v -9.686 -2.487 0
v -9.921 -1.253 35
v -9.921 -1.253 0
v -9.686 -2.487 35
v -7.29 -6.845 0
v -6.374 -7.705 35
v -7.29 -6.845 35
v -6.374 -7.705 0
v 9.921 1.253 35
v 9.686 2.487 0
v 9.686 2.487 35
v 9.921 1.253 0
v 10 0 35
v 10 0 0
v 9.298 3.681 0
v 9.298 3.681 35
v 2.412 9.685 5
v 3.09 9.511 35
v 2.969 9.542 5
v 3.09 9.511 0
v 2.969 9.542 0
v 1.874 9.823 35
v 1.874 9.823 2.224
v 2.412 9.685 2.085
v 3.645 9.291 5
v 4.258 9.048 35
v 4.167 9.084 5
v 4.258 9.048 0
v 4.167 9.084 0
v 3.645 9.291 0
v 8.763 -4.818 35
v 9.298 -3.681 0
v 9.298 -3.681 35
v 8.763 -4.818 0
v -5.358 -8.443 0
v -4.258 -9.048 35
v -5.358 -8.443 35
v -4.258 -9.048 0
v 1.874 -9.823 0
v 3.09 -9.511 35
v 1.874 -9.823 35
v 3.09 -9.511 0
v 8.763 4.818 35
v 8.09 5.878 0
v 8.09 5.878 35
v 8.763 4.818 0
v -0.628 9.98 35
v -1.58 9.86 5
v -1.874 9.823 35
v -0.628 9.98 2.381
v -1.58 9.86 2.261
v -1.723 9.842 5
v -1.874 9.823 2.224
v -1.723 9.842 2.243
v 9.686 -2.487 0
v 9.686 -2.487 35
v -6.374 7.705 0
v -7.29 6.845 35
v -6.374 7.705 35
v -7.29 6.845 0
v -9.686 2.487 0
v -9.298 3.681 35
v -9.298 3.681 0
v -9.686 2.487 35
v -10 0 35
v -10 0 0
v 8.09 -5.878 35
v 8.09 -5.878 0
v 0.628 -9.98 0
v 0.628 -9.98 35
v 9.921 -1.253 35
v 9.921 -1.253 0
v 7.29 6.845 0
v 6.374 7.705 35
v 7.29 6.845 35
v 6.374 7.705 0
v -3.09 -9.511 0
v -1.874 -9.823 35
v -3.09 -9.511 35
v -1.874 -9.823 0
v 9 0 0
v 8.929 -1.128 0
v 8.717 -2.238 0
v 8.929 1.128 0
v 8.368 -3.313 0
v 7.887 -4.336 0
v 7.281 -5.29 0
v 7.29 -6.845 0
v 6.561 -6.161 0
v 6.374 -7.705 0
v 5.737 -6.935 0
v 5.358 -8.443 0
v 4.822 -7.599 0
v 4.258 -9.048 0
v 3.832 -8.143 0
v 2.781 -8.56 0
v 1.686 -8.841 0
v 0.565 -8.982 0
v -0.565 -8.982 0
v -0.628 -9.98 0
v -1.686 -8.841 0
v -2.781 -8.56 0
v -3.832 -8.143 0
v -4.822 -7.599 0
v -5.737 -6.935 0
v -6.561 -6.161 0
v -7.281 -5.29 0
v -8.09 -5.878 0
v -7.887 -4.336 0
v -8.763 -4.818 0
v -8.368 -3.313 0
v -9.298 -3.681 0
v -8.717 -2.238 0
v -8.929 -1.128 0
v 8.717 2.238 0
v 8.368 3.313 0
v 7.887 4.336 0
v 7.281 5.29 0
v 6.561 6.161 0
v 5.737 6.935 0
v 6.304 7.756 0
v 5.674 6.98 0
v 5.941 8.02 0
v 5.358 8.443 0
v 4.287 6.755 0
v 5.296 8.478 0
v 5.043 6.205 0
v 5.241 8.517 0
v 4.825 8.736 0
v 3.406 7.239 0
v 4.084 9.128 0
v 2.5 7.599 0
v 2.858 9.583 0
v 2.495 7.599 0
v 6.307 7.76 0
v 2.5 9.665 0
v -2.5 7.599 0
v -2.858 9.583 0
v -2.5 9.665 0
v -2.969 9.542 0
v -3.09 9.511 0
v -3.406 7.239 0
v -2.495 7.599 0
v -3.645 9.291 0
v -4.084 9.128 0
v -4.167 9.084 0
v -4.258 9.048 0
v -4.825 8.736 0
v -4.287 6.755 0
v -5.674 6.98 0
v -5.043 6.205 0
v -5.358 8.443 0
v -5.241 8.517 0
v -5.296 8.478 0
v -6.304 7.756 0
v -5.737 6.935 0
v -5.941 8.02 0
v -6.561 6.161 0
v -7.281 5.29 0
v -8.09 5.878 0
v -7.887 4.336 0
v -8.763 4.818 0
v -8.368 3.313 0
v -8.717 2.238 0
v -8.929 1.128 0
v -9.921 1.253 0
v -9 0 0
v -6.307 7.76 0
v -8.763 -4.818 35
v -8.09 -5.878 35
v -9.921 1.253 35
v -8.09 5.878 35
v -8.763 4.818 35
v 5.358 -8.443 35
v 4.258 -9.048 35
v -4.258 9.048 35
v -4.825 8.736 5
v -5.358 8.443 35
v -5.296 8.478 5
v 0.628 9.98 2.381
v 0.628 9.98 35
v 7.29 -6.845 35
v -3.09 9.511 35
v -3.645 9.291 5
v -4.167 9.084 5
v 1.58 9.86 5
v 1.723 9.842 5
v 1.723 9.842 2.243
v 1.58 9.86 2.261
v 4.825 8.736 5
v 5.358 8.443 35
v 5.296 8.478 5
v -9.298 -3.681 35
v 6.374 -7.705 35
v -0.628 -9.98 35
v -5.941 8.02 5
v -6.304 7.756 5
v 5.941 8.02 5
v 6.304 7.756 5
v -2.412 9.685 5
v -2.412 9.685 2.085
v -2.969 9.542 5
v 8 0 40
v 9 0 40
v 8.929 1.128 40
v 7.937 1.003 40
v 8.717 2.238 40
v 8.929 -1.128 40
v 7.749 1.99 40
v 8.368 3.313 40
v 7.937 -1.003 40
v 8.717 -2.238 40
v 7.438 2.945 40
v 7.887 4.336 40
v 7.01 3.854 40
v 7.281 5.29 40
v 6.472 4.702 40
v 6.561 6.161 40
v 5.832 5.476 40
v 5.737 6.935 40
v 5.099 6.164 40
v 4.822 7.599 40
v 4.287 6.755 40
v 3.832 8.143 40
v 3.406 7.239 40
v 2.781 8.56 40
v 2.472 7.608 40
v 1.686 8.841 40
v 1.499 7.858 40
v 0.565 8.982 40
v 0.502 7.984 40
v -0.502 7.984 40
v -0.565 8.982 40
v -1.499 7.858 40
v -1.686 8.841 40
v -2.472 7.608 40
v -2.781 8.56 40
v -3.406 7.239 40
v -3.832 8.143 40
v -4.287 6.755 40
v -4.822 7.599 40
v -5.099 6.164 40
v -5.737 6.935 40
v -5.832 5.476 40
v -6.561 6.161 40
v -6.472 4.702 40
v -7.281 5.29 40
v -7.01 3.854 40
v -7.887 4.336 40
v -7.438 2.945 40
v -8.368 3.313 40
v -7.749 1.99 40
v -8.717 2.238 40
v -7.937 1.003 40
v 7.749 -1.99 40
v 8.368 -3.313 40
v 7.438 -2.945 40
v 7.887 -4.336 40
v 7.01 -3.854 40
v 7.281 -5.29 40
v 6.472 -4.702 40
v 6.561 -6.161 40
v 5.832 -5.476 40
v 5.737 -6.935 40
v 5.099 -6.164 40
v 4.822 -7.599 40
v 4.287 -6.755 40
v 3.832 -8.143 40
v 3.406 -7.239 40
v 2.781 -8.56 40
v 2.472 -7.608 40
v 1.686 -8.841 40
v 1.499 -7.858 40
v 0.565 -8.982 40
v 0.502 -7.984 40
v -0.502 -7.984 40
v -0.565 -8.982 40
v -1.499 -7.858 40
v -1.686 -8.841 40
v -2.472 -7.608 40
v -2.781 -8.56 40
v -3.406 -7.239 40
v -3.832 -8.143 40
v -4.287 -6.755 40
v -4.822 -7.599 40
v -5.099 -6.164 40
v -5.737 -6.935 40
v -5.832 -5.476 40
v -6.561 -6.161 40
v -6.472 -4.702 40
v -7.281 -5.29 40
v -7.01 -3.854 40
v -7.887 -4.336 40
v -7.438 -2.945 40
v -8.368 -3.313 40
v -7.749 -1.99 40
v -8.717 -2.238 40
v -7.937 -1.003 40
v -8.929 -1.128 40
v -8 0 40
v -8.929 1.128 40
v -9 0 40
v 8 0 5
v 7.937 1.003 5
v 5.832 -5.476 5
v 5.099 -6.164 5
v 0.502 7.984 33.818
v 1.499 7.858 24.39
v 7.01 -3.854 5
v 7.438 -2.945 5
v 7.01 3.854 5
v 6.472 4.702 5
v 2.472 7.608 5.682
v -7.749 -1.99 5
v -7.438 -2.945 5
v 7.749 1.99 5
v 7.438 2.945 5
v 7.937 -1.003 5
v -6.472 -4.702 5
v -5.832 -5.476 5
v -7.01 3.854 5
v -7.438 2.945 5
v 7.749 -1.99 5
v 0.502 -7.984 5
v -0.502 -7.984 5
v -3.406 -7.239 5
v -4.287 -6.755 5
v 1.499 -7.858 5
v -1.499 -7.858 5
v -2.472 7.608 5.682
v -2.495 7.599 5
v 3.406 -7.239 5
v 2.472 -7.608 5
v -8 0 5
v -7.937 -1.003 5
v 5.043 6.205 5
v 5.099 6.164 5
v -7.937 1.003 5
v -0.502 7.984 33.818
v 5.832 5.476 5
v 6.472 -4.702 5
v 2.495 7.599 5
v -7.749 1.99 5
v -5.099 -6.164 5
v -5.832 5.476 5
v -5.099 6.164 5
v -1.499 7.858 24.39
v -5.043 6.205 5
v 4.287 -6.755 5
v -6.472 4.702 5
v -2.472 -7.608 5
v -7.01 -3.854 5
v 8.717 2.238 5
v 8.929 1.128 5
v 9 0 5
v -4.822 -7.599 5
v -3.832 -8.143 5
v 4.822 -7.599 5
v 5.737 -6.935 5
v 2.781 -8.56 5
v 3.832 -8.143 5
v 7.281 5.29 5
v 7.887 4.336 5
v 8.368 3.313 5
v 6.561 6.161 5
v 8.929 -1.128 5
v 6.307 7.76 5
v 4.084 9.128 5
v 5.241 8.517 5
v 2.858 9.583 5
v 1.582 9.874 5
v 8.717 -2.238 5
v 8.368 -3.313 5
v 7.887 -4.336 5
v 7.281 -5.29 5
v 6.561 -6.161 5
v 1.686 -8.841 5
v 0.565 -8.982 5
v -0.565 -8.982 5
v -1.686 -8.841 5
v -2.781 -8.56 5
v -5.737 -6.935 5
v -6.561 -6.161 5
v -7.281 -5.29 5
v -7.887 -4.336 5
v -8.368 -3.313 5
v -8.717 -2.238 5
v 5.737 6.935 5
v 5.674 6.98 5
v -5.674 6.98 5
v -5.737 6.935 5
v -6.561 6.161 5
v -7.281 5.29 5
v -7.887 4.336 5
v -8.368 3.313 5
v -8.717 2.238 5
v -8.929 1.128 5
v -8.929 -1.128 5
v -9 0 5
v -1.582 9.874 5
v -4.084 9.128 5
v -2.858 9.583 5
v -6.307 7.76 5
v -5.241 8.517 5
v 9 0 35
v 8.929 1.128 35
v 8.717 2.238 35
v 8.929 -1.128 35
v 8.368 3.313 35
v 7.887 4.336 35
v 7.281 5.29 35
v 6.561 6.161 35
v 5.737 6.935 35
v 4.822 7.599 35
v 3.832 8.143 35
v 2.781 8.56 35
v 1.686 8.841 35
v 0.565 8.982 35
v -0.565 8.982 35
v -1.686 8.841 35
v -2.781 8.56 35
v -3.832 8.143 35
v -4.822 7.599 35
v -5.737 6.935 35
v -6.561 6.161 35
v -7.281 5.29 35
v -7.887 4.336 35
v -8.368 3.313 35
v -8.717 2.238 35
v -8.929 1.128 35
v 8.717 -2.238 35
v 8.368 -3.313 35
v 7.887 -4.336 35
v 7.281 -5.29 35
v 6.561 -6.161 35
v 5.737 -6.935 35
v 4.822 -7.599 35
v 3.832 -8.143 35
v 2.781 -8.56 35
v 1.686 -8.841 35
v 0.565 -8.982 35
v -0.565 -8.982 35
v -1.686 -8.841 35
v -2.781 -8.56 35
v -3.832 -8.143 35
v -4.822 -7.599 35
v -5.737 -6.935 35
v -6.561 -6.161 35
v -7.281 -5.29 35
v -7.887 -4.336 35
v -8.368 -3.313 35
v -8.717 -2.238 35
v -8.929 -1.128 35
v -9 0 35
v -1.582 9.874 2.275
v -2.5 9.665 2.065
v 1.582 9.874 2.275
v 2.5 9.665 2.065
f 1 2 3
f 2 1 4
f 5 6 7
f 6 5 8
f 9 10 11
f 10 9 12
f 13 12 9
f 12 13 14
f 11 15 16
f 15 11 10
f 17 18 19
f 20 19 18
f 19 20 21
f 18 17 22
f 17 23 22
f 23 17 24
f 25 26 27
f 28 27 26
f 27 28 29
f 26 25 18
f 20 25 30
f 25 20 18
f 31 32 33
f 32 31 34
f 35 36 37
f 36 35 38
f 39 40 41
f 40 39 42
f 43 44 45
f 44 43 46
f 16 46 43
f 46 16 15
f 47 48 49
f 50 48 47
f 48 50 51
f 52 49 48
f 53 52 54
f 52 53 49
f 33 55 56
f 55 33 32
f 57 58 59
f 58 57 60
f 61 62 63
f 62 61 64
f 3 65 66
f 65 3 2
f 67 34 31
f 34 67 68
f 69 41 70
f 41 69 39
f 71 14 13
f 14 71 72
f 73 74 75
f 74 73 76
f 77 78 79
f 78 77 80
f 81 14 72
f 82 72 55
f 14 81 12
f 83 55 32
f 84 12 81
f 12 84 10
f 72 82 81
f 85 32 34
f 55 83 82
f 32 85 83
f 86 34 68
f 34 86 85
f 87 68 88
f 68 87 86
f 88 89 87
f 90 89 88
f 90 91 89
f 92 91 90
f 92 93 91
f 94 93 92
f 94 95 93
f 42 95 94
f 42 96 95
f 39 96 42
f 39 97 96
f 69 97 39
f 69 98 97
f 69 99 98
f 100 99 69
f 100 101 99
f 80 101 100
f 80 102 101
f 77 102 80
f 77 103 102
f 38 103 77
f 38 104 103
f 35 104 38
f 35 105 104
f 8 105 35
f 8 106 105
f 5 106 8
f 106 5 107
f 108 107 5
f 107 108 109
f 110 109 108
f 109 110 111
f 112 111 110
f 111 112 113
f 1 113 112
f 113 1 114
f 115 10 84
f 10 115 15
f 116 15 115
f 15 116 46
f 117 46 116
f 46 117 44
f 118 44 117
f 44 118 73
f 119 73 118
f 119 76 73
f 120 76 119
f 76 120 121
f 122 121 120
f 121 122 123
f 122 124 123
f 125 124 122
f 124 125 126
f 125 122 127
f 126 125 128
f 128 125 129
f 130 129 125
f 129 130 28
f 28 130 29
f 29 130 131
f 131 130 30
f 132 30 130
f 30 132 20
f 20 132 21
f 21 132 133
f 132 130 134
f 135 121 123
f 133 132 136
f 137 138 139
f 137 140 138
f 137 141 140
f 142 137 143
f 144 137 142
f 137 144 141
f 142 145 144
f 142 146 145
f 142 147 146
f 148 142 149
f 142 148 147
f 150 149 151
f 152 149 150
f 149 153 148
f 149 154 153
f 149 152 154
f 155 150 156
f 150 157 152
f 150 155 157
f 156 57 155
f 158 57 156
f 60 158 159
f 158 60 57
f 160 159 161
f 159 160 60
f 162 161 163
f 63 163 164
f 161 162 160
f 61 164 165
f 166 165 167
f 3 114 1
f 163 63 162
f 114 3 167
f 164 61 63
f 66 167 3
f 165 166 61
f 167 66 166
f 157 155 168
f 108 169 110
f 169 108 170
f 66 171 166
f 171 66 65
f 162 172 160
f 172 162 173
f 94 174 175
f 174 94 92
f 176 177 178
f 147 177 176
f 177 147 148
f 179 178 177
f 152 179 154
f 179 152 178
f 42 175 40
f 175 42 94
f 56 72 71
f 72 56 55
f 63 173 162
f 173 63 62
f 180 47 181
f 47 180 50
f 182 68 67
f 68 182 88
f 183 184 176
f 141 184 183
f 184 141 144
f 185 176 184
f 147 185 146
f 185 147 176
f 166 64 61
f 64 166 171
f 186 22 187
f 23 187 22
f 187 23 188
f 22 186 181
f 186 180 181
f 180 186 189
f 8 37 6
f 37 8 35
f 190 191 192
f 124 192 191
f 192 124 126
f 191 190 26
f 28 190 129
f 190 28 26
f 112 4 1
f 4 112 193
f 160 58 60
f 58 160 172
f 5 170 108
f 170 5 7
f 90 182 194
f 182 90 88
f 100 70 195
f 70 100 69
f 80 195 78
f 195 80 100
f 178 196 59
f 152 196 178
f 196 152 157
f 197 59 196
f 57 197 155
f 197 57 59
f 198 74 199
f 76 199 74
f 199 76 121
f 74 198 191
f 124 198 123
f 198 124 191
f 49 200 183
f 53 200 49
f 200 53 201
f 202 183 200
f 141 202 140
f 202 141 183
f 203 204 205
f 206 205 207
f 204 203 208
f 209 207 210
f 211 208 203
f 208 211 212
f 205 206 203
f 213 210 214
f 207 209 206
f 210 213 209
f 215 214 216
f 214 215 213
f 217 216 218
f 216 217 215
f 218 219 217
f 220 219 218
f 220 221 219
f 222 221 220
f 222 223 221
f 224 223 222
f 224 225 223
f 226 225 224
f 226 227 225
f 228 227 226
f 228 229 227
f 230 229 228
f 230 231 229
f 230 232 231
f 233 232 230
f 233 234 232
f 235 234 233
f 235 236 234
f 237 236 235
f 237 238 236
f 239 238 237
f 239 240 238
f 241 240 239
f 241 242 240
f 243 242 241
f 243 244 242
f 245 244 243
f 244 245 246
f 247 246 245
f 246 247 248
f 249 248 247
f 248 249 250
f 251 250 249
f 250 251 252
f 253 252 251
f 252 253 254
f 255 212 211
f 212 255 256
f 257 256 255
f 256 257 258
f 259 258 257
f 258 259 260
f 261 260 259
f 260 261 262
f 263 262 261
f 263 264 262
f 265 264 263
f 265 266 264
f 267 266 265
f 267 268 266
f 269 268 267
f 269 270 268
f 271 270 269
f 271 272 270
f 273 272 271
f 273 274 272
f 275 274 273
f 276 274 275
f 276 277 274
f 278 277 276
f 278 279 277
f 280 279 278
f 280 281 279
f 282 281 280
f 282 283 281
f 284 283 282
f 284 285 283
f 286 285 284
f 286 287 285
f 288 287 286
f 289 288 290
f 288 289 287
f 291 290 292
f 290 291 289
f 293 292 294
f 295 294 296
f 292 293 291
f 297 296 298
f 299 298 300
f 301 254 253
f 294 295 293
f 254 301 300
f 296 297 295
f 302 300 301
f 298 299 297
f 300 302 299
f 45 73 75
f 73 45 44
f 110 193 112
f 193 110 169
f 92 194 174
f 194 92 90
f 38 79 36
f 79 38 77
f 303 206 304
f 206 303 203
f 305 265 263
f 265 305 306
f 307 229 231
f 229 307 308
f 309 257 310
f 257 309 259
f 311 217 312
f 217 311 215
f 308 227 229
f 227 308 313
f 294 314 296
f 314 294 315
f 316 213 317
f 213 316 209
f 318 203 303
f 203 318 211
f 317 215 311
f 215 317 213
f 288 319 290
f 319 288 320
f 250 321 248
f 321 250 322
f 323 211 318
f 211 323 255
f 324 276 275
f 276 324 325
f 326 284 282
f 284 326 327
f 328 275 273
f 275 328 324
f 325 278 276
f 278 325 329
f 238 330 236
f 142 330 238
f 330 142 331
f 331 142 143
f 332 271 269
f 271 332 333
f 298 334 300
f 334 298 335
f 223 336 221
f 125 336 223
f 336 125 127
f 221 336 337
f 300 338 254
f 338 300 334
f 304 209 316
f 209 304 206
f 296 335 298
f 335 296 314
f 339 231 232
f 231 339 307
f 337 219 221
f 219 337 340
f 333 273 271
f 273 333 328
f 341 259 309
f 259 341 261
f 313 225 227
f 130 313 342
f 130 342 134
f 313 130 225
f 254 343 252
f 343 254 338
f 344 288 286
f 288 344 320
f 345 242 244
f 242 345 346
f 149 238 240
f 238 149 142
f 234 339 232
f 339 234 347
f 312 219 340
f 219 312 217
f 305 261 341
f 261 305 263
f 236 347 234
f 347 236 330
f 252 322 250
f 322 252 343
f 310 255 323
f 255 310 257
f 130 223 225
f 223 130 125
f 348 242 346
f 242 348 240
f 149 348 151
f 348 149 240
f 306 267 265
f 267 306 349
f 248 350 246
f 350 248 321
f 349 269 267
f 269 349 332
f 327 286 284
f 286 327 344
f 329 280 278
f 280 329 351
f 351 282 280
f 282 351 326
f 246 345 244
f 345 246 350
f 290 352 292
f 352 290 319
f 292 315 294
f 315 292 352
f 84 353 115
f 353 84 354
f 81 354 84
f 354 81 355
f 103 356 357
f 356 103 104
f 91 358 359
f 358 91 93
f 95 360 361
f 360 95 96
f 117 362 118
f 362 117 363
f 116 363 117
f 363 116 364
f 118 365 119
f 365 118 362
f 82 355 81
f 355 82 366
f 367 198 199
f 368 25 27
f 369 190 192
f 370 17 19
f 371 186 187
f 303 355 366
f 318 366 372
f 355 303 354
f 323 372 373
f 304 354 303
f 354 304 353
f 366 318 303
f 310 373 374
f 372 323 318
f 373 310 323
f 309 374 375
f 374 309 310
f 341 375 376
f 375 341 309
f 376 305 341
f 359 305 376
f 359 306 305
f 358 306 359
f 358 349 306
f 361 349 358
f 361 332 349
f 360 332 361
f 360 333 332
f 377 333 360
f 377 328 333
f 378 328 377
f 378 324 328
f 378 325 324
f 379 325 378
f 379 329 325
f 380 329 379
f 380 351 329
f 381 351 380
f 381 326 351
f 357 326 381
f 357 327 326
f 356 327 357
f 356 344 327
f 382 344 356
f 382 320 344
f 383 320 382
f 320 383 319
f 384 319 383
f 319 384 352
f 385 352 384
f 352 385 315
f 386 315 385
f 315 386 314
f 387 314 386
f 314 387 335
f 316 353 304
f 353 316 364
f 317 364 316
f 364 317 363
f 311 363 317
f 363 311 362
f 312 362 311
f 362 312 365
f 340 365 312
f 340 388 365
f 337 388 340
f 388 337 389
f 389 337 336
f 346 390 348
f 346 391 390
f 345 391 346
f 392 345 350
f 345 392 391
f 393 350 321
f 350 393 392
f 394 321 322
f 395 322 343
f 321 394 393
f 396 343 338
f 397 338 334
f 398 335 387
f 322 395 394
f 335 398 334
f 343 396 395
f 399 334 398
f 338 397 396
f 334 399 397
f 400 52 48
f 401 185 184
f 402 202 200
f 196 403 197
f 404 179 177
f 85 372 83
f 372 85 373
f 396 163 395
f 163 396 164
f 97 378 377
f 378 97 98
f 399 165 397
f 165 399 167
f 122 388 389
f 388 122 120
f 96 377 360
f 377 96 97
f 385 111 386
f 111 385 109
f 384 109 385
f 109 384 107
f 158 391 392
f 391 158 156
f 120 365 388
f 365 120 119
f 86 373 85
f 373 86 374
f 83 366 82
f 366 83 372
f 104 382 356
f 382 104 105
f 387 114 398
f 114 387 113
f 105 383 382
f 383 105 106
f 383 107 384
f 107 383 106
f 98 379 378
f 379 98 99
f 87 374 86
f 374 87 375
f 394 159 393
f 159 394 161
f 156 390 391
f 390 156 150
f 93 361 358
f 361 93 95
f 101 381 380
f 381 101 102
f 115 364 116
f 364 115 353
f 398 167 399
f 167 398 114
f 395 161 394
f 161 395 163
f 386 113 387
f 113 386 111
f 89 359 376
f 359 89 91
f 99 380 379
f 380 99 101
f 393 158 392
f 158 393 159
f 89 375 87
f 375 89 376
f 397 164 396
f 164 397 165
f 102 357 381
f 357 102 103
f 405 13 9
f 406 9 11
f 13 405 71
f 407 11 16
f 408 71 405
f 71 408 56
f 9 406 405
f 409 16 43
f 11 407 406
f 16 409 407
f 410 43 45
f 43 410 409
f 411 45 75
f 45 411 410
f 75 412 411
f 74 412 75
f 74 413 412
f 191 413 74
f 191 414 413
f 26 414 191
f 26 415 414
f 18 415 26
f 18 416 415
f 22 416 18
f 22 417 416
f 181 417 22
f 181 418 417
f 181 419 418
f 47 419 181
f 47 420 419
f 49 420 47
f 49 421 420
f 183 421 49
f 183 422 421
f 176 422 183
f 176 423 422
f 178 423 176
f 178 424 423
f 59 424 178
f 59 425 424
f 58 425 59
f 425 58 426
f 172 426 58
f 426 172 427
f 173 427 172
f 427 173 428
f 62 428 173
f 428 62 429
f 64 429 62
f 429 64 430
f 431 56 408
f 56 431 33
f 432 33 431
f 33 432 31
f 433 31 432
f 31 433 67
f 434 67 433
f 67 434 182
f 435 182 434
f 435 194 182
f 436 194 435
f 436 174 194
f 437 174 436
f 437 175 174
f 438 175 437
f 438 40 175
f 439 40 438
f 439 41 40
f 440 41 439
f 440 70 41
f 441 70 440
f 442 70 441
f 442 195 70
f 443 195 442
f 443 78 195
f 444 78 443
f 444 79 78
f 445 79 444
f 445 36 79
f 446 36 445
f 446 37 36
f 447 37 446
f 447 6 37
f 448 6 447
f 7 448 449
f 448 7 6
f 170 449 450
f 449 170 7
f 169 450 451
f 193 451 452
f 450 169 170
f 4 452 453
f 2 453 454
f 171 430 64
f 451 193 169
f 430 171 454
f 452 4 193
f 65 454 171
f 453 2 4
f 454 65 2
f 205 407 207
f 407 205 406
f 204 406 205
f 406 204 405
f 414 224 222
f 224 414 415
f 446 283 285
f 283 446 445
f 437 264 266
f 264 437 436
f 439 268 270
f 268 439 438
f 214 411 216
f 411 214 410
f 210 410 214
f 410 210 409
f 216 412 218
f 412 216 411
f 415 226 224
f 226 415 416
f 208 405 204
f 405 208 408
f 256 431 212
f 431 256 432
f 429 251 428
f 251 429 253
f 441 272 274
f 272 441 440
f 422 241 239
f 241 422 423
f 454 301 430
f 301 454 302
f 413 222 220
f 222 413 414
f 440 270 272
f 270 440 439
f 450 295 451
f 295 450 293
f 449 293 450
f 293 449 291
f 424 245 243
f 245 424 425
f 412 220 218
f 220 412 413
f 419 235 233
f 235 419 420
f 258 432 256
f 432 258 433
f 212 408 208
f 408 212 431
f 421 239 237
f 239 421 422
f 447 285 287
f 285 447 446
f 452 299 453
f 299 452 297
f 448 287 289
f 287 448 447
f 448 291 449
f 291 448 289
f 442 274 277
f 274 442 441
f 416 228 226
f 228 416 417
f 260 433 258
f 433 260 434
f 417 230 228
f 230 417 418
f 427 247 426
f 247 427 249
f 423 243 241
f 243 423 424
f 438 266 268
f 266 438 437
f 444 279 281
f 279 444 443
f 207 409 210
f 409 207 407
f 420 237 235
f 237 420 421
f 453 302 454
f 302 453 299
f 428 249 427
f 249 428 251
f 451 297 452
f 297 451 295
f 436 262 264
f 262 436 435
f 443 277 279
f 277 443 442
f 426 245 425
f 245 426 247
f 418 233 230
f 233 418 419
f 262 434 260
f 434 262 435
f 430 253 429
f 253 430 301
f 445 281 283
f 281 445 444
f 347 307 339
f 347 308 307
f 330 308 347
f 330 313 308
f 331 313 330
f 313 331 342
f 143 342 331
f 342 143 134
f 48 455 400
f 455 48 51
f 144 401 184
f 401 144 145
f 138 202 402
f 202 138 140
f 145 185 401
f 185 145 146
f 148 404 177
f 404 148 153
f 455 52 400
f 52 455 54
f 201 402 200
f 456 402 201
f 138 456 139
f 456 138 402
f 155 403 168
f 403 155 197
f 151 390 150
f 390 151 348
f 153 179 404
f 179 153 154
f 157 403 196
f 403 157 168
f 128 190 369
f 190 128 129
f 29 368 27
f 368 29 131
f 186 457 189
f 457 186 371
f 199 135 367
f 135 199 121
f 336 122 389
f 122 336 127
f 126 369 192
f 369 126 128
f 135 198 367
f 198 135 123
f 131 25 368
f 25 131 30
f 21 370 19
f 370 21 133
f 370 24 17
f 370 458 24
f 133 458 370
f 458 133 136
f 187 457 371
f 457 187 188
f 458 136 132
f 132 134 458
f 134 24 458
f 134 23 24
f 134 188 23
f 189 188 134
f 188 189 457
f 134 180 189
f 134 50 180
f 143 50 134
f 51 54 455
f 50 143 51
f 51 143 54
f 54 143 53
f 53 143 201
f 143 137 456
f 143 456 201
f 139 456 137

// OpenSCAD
// file: arc.scad
module sector(radius, height, start, end) {
  rotate([0,0,start])
  rotate_extrude(angle=end-start) {
    square([radius,height]);
  }
}

module arc(inner, outer, height, start, end) {
  difference(){
    sector(outer,height,start,end);
    sector(inner,height,0,360);
  }
}

arc(8,10,5,30,60);
// file: segment.scad
// Section

module pipe(inner, outer, length) {
  difference() {
    cylinder(r=outer, h=length);
    cylinder(r=inner, h=length);
  }
}

// so other modules can see these values
function coupler_height () = 5;

module coupler(inner, outer, top){
  h = coupler_height();
  w = (outer - inner) / 2;
  if (top) {
    translate([0,0,-h]) pipe(inner+w, outer, h);
  } else {
    pipe(inner, outer-w, h);
  }
}


module segment(inner, outer, length) {
  difference() {
    pipe(inner, outer, length);
    coupler(inner, outer, false);
    translate([0,0,length]) coupler(inner, outer, true);
  }
}

segment(8,10,20);
// main file
use <segment.scad>;
use <arc.scad>;

function lip_radius(inner, width) = sqrt(pow(inner,2) - pow(width/2,2));
  /*
    / \    |
  r/   \   | h
  /__w__\  |

  s = (r+r+w)/2 = r + w/2
  A = sqrt(s(s-r)(s-r)(s-w))
    = sqrt( s (s-r)^2 (s-w) )
    = sqrt( (r+w/2) (r+w/2-r)^2 (r+w/2-w) )
    = sqrt( (r+w/2) (w/2)^2 (r-w/2) )
    = sqrt( (r^2 - (w/2)^2) (w/2)^2 )
    = (w/2) sqrt(r^2 - (w/2)^2)
  A = wh/2
  h = 2A/w
    = 2/w (w/2) sqrt(r^2 - (w/2)^2)
    = sqrt(r^2 - (w/2)^2)
  */

function lip_height (inner, outer, width, angle) = tan(angle) * (outer - lip_radius(inner, width));

module lip(inner, outer, width, angle) {
  w2 = width/2;
  r = lip_radius(inner, width);
  h = lip_height(inner, outer, width, angle);
  points = [
    [-w2,r,0],
    [w2,r,0],
    [-w2,outer,0],
    [w2,outer,0],
    [-w2,outer,h],
    [w2,outer,h]
  ];
  faces = [
    [0,1,3,2],
    [1,0,4,5],
    [2,3,5,4],
    [0,2,4],
    [1,5,3]
  ];
  polyhedron(points, faces);
}

// could collide with segment.collar
module chin(inner, outer, length, width, angle) {
  r = lip_radius(inner, width);
  bottom_offset = max(coupler_height(), lip_height(inner, outer, width, angle));
  top_offset = length - coupler_height();
  w = inner-r;
  relief = atan2(-w,top_offset - bottom_offset);

  intersection() {
    cylinder(r=outer,h=length);
    translate([-width/2,r,0]) {
      translate([0,0,bottom_offset]) rotate([relief,0,0]) cube([width, outer-r, top_offset-bottom_offset]);
      cube([width, outer-r, bottom_offset]);
    }
  }

  cheek_angle = asin((width/2)/inner)/2;
  arc(inner,outer,coupler_height(),90+cheek_angle,90+cheek_angle+30);
  arc(inner,outer,coupler_height(),90-cheek_angle,90-cheek_angle-30);
}

inner = 8;
outer = 10;
length = 40;
width = 5;
angle = 45;

$fn=50;

difference() {
  union() {
    segment(inner, outer, length);
    chin(inner, outer, length, width, angle);
  }
  lip(inner, outer, width, angle);
}

// chin(inner, outer, width, length);
// lip(inner, outer, width, angle);


// chin(inner, outer, length, width, angle);
// translate([0,0,10]) lip(inner, outer, width, angle);
